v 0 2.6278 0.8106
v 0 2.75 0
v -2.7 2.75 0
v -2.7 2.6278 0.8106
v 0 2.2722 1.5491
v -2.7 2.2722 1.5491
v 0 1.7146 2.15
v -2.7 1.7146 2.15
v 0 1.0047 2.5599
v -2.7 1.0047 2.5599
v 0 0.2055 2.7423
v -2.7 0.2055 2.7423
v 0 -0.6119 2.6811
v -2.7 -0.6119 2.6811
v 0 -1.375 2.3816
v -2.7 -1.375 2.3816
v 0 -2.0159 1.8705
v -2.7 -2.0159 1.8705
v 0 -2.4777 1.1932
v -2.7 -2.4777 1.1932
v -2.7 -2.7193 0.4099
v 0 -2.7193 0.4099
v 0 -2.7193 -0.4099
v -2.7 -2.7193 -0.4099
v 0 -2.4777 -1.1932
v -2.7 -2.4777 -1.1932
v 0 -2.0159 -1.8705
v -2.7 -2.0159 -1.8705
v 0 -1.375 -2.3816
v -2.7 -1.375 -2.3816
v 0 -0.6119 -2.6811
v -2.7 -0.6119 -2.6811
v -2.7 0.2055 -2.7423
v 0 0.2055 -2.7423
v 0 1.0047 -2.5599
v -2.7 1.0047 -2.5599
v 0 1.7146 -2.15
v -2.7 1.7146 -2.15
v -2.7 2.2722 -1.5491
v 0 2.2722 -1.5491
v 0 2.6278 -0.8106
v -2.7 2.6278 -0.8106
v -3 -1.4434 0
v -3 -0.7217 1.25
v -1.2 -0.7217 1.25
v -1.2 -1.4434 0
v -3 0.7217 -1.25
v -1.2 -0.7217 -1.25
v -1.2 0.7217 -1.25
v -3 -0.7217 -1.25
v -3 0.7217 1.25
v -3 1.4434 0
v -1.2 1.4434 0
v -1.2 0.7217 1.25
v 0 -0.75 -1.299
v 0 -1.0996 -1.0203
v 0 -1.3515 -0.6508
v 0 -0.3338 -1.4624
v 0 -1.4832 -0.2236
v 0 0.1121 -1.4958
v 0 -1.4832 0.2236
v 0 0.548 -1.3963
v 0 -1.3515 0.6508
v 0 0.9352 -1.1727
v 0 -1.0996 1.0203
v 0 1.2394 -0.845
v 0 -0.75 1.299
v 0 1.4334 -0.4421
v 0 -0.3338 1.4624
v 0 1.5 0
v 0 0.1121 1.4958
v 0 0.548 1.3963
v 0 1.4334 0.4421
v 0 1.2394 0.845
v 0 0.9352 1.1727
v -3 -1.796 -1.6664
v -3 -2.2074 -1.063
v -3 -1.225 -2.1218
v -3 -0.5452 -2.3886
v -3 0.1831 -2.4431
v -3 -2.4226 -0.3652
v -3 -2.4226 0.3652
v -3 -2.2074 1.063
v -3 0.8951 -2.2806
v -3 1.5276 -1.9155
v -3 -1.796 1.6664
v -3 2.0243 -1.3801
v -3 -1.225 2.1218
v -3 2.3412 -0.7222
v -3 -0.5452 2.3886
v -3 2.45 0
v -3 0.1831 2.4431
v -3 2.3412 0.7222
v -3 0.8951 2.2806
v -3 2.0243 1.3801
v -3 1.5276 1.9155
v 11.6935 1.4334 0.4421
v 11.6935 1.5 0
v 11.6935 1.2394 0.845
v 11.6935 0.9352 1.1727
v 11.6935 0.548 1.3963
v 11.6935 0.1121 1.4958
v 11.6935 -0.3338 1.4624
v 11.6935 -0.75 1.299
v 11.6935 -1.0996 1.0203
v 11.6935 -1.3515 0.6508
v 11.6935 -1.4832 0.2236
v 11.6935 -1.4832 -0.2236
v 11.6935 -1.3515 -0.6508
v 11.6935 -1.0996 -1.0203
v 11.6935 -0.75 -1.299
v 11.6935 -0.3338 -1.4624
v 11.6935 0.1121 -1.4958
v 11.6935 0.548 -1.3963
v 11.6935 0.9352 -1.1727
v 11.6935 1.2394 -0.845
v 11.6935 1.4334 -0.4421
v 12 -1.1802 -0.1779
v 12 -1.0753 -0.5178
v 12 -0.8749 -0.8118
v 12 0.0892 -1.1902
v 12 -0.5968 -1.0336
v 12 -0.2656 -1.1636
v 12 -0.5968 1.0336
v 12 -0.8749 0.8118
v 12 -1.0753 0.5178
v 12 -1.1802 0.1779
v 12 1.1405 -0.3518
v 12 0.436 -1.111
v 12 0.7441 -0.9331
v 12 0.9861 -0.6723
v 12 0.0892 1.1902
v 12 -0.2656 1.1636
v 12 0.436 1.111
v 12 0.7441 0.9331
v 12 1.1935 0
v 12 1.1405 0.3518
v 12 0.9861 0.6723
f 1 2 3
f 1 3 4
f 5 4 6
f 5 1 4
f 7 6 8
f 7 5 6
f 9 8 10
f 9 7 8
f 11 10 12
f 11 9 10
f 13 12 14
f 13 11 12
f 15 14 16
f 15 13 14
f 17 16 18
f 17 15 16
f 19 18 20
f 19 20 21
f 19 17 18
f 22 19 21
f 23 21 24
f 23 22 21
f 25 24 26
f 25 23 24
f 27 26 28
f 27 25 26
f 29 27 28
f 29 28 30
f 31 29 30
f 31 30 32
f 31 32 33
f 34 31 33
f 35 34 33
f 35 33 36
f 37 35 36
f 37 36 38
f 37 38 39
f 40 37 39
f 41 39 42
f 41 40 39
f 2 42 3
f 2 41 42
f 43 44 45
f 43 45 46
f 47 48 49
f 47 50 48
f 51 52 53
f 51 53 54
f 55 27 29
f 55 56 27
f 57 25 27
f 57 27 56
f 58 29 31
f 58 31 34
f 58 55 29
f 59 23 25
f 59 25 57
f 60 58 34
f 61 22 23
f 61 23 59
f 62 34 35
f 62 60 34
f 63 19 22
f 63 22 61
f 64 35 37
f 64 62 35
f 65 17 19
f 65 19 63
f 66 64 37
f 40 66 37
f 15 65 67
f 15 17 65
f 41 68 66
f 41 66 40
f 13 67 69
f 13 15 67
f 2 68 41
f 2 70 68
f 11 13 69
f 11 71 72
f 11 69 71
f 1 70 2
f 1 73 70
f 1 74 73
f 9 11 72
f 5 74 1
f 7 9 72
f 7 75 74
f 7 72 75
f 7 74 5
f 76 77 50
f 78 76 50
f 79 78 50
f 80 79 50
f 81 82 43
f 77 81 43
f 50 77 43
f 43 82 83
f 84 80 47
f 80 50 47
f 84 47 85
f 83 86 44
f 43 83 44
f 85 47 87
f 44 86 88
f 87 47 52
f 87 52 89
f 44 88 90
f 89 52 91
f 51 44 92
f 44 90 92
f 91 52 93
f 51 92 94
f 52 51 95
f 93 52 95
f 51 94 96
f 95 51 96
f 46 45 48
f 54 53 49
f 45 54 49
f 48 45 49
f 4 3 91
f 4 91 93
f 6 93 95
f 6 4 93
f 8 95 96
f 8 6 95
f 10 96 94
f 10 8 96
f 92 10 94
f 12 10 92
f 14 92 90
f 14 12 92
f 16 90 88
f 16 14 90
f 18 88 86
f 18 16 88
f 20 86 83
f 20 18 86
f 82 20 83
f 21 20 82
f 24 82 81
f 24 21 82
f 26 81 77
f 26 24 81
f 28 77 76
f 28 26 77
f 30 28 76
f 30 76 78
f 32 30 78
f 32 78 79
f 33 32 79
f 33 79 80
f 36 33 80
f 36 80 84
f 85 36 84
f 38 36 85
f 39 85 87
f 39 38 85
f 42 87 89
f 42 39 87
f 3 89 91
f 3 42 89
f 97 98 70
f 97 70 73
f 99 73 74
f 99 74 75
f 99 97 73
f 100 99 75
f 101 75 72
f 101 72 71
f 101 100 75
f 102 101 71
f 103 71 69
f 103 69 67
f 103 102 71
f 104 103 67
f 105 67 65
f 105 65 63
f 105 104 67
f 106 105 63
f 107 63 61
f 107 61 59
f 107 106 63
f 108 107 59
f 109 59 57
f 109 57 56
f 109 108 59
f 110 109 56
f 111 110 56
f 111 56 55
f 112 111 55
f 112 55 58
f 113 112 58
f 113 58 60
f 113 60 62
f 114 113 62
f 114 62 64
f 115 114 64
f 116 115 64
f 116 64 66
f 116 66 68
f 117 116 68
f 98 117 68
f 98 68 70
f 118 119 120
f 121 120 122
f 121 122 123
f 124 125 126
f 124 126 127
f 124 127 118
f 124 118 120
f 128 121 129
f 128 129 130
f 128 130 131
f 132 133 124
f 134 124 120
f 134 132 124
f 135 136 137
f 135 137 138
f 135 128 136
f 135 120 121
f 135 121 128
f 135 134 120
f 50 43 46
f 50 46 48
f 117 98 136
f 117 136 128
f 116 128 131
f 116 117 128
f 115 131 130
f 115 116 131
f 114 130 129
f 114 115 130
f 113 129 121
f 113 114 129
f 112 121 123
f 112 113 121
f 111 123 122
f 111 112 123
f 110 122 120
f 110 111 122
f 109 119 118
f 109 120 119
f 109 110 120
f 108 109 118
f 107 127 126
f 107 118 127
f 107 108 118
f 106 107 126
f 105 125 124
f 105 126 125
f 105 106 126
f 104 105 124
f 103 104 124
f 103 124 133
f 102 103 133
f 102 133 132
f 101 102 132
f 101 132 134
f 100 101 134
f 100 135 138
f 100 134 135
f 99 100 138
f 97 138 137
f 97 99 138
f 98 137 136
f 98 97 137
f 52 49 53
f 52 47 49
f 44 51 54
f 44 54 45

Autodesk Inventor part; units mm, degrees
ref_plane "YZ Plane" through (0, 0, 0) normal (1, 0, 0) x (0, 1, 0)
ref_plane "XZ Plane" through (0, 0, 0) normal (0, 1, 0) x (-1, 0, 0)
ref_plane "XY Plane" through (0, 0, 0) normal (0, 0, 1) x (1, 0, 0)
sketch "Sketch_1" plane through (0, 0, 0) normal (0, 0, 1) x (1, 0, 0)
  line L0 (12, 0) -> (-3, 0)
  line L1 (-3, 0) -> (-3, 2.45)
  line L2 (-3, 2.45) -> (-2.7, 2.75)
  line L3 (-2.7, 2.75) -> (0, 2.75)
  line L4 (0, 2.75) -> (0, 1.5)
  line L5 (0, 1.5) -> (11.6935, 1.5)
  line L6 (11.6935, 1.5) -> (12, 1.1935)
  line L7 (12, 1.1935) -> (12, 0)
  line L8 (12, 0) -> (-3, 0)
revolve "Revolution1" add sketch "Sketch_1" angle 360 about axis through (12, 0, 0) along (1, 0, 0)
thread "Thread1" size "M3x0.5" class "6g" standard "ISO Metric profile" length 11.4691 offset 0.5309
sketch "Sketch_2" plane through (-3, 0, 0) normal (1, 0, 0) x (0, 0, -1)
  line L0 (-1.25, -0.7217) -> (0, -1.4434)
  line L1 (0, -1.4434) -> (1.25, -0.7217)
  line L2 (1.25, -0.7217) -> (1.25, 0.7217)
  line L3 (1.25, 0.7217) -> (0, 1.4434)
  line L4 (0, 1.4434) -> (-1.25, 0.7217)
  line L5 (-1.25, 0.7217) -> (-1.25, -0.7217)
extrude "Extrusion1" cut sketch "Sketch_2" along normal blind 1.8
properties part number "SNSX-M3-12-88"
